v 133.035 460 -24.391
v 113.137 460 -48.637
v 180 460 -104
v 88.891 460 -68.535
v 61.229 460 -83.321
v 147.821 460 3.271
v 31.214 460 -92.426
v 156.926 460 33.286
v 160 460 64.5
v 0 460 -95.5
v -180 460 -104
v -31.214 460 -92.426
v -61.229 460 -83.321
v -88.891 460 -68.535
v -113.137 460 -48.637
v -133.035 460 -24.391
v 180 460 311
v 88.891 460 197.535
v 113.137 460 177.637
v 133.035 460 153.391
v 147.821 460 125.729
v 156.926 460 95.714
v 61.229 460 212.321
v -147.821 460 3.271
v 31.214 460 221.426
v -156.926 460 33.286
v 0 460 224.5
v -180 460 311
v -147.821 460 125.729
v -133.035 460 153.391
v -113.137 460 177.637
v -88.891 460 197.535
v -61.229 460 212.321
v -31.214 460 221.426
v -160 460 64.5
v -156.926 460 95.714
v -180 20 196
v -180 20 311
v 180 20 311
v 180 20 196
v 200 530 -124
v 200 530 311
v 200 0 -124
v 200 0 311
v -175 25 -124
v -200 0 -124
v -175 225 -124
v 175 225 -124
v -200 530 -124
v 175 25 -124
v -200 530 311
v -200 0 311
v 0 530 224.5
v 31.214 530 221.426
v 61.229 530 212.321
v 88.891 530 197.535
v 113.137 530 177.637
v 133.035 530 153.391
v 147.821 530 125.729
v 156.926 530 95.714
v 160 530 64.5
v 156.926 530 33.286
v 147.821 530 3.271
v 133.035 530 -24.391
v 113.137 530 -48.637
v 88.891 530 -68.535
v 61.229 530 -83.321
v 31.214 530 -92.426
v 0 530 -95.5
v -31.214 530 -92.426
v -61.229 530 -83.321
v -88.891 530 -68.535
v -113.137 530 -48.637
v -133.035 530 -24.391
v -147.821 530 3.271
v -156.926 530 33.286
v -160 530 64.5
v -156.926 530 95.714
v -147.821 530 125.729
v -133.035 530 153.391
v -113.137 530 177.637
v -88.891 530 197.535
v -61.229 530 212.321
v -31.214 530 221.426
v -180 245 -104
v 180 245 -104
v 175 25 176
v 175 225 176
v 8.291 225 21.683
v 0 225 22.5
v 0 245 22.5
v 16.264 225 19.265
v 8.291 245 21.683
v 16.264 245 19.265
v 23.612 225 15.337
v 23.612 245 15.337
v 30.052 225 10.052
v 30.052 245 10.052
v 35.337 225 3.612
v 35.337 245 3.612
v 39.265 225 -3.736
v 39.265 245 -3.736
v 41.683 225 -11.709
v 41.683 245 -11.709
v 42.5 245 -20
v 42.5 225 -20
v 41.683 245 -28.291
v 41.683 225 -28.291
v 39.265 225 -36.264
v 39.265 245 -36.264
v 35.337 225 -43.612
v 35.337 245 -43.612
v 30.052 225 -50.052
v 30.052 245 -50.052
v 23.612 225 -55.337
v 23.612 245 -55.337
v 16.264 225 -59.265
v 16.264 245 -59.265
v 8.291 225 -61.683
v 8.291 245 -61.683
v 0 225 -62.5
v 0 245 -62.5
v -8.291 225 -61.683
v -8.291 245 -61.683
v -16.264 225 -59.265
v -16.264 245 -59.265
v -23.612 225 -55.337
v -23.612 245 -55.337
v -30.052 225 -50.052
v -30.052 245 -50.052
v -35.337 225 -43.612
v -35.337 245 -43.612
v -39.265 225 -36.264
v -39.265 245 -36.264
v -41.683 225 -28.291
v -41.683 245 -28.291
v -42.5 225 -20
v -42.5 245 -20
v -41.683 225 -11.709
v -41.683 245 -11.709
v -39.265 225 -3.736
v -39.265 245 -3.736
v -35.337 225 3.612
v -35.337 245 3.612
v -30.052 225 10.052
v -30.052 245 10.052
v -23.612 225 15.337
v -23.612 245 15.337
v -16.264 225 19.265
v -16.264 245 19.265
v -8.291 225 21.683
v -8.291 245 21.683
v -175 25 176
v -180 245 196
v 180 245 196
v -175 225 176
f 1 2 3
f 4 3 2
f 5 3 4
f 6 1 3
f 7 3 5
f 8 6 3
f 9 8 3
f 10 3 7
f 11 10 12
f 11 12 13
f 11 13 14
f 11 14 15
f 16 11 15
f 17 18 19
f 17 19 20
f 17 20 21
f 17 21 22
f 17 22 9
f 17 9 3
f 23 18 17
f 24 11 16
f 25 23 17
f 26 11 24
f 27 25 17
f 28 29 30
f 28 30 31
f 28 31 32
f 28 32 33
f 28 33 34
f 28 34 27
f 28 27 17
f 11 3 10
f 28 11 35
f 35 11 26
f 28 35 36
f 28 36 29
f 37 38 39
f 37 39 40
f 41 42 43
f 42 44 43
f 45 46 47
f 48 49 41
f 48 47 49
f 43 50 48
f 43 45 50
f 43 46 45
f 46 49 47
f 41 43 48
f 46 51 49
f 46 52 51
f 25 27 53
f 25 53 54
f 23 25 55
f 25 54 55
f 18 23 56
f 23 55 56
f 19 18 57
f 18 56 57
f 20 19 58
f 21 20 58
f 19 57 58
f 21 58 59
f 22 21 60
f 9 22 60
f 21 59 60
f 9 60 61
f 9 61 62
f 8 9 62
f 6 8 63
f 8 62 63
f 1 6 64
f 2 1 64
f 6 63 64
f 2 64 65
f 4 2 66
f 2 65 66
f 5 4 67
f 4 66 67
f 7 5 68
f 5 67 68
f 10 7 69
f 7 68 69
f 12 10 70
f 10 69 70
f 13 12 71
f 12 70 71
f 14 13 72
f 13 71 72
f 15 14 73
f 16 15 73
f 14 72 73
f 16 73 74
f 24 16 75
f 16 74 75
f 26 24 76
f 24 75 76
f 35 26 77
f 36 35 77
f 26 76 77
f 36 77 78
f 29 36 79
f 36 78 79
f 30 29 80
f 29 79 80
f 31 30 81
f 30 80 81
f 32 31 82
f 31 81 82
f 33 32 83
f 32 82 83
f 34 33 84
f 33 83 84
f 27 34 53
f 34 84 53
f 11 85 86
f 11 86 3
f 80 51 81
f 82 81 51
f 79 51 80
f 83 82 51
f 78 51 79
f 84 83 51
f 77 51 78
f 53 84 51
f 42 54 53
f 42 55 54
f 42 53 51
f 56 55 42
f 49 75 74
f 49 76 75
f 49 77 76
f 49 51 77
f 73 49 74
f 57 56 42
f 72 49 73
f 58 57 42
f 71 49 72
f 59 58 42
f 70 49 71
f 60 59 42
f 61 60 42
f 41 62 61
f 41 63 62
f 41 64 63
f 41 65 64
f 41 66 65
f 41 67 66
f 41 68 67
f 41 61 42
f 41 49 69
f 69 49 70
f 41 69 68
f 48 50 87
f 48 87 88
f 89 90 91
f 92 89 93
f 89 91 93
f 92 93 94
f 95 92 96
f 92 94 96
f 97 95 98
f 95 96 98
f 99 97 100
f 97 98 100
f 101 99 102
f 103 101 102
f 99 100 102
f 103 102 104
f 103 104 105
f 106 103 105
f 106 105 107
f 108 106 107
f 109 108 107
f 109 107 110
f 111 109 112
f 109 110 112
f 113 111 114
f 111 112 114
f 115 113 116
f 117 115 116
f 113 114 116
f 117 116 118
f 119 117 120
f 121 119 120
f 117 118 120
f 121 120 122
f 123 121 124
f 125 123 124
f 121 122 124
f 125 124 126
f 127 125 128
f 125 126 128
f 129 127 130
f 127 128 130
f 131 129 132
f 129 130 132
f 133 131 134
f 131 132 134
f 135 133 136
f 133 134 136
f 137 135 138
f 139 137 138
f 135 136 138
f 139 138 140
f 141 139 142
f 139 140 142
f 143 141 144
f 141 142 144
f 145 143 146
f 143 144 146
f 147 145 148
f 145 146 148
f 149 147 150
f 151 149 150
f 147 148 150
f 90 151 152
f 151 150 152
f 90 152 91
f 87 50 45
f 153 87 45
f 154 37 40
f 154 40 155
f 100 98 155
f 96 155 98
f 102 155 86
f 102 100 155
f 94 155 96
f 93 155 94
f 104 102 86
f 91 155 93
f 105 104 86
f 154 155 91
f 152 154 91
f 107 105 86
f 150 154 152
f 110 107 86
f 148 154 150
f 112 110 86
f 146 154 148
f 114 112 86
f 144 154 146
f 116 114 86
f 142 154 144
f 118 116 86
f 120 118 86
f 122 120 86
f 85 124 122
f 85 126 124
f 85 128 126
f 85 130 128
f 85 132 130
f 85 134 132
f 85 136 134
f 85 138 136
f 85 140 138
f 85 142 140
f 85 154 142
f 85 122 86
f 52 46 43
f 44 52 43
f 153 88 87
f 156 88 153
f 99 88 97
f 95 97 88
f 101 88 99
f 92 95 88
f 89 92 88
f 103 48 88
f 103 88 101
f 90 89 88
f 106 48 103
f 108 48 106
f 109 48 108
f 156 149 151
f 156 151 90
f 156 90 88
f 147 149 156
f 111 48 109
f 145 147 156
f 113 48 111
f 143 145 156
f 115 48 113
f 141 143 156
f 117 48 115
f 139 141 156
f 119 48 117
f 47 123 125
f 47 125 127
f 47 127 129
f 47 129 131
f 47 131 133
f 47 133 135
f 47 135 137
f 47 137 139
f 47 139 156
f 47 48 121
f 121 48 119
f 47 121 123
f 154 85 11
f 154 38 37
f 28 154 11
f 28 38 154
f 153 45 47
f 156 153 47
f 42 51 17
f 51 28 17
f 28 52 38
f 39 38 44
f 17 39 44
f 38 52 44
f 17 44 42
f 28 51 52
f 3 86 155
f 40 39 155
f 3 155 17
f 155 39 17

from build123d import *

# Parameters (mm, degrees)
SKETCH1_W           = 400
SKETCH1_H           = 435
BOSS_EXTRUDE1_DEPTH = 480
SKETCH4_W           = 350
SKETCH4_H           = 200
CUT_EXTRUDE1_DEPTH  = 300
SHELL1_START        = -180
SHELL1_DEPTH        = 360
SKETCH5_W           = 400
SKETCH5_H           = 435
BOSS_EXTRUDE2_DEPTH = 50
SKETCH3_R           = 160
CUT_EXTRUDE2_DEPTH  = 70
SKETCH6_R           = 42.5
CUT_EXTRUDE3_DEPTH  = 20


# Read off the part's stored shape, not the designer's step: Shell1
with BuildPart() as part:
    # Sketch1 → Boss-Extrude1 (new body)
    with BuildSketch(Plane(origin=(0, 0, 0), x_dir=(1, 0, 0), z_dir=(0, 1, 0))):
        with Locations((0, -93.5)):
            Rectangle(SKETCH1_W, SKETCH1_H)
    extrude(amount=BOSS_EXTRUDE1_DEPTH)

    # Sketch4 → Cut-Extrude1 (cut)
    with BuildSketch(Plane(origin=(0, 0, -124), x_dir=(-1, 0, 0), z_dir=(0, 0, -1))):
        with Locations((0, 125)):
            Rectangle(SKETCH4_W, SKETCH4_H)
    extrude(amount=-CUT_EXTRUDE1_DEPTH, mode=Mode.SUBTRACT)

    # Shell1 outline → Shell1 (cut)
    with BuildSketch(Plane.YZ.offset(SHELL1_START)):
        Polygon((245, -104), (460, -104), (460, 311), (20, 311), (20, 196), (245, 196), align=None)
    extrude(amount=SHELL1_DEPTH, mode=Mode.SUBTRACT)

    # Sketch5 → Boss-Extrude2 (add)
    with BuildSketch(Plane(origin=(0, 480, 0), x_dir=(1, 0, 0), z_dir=(0, 1, 0))):
        with Locations((0, -93.5)):
            Rectangle(SKETCH5_W, SKETCH5_H)
    extrude(amount=BOSS_EXTRUDE2_DEPTH)

    # Sketch3 → Cut-Extrude2 (cut)
    with BuildSketch(Plane(origin=(0, 530, 0), x_dir=(1, 0, 0), z_dir=(0, 1, 0))):
        with Locations(Location((0, -64.5, 0), (0, 0, 270))):
            Circle(SKETCH3_R)
    extrude(amount=-CUT_EXTRUDE2_DEPTH, mode=Mode.SUBTRACT)

    # Sketch6 → Cut-Extrude3 (cut)
    with BuildSketch(Plane(origin=(0, 245, 0), x_dir=(1, 0, 0), z_dir=(0, 1, 0))):
        with Locations(Location((0, 20, 0), (0, 0, 270))):
            Circle(SKETCH6_R)
    extrude(amount=-CUT_EXTRUDE3_DEPTH, mode=Mode.SUBTRACT)


solid = part.part
